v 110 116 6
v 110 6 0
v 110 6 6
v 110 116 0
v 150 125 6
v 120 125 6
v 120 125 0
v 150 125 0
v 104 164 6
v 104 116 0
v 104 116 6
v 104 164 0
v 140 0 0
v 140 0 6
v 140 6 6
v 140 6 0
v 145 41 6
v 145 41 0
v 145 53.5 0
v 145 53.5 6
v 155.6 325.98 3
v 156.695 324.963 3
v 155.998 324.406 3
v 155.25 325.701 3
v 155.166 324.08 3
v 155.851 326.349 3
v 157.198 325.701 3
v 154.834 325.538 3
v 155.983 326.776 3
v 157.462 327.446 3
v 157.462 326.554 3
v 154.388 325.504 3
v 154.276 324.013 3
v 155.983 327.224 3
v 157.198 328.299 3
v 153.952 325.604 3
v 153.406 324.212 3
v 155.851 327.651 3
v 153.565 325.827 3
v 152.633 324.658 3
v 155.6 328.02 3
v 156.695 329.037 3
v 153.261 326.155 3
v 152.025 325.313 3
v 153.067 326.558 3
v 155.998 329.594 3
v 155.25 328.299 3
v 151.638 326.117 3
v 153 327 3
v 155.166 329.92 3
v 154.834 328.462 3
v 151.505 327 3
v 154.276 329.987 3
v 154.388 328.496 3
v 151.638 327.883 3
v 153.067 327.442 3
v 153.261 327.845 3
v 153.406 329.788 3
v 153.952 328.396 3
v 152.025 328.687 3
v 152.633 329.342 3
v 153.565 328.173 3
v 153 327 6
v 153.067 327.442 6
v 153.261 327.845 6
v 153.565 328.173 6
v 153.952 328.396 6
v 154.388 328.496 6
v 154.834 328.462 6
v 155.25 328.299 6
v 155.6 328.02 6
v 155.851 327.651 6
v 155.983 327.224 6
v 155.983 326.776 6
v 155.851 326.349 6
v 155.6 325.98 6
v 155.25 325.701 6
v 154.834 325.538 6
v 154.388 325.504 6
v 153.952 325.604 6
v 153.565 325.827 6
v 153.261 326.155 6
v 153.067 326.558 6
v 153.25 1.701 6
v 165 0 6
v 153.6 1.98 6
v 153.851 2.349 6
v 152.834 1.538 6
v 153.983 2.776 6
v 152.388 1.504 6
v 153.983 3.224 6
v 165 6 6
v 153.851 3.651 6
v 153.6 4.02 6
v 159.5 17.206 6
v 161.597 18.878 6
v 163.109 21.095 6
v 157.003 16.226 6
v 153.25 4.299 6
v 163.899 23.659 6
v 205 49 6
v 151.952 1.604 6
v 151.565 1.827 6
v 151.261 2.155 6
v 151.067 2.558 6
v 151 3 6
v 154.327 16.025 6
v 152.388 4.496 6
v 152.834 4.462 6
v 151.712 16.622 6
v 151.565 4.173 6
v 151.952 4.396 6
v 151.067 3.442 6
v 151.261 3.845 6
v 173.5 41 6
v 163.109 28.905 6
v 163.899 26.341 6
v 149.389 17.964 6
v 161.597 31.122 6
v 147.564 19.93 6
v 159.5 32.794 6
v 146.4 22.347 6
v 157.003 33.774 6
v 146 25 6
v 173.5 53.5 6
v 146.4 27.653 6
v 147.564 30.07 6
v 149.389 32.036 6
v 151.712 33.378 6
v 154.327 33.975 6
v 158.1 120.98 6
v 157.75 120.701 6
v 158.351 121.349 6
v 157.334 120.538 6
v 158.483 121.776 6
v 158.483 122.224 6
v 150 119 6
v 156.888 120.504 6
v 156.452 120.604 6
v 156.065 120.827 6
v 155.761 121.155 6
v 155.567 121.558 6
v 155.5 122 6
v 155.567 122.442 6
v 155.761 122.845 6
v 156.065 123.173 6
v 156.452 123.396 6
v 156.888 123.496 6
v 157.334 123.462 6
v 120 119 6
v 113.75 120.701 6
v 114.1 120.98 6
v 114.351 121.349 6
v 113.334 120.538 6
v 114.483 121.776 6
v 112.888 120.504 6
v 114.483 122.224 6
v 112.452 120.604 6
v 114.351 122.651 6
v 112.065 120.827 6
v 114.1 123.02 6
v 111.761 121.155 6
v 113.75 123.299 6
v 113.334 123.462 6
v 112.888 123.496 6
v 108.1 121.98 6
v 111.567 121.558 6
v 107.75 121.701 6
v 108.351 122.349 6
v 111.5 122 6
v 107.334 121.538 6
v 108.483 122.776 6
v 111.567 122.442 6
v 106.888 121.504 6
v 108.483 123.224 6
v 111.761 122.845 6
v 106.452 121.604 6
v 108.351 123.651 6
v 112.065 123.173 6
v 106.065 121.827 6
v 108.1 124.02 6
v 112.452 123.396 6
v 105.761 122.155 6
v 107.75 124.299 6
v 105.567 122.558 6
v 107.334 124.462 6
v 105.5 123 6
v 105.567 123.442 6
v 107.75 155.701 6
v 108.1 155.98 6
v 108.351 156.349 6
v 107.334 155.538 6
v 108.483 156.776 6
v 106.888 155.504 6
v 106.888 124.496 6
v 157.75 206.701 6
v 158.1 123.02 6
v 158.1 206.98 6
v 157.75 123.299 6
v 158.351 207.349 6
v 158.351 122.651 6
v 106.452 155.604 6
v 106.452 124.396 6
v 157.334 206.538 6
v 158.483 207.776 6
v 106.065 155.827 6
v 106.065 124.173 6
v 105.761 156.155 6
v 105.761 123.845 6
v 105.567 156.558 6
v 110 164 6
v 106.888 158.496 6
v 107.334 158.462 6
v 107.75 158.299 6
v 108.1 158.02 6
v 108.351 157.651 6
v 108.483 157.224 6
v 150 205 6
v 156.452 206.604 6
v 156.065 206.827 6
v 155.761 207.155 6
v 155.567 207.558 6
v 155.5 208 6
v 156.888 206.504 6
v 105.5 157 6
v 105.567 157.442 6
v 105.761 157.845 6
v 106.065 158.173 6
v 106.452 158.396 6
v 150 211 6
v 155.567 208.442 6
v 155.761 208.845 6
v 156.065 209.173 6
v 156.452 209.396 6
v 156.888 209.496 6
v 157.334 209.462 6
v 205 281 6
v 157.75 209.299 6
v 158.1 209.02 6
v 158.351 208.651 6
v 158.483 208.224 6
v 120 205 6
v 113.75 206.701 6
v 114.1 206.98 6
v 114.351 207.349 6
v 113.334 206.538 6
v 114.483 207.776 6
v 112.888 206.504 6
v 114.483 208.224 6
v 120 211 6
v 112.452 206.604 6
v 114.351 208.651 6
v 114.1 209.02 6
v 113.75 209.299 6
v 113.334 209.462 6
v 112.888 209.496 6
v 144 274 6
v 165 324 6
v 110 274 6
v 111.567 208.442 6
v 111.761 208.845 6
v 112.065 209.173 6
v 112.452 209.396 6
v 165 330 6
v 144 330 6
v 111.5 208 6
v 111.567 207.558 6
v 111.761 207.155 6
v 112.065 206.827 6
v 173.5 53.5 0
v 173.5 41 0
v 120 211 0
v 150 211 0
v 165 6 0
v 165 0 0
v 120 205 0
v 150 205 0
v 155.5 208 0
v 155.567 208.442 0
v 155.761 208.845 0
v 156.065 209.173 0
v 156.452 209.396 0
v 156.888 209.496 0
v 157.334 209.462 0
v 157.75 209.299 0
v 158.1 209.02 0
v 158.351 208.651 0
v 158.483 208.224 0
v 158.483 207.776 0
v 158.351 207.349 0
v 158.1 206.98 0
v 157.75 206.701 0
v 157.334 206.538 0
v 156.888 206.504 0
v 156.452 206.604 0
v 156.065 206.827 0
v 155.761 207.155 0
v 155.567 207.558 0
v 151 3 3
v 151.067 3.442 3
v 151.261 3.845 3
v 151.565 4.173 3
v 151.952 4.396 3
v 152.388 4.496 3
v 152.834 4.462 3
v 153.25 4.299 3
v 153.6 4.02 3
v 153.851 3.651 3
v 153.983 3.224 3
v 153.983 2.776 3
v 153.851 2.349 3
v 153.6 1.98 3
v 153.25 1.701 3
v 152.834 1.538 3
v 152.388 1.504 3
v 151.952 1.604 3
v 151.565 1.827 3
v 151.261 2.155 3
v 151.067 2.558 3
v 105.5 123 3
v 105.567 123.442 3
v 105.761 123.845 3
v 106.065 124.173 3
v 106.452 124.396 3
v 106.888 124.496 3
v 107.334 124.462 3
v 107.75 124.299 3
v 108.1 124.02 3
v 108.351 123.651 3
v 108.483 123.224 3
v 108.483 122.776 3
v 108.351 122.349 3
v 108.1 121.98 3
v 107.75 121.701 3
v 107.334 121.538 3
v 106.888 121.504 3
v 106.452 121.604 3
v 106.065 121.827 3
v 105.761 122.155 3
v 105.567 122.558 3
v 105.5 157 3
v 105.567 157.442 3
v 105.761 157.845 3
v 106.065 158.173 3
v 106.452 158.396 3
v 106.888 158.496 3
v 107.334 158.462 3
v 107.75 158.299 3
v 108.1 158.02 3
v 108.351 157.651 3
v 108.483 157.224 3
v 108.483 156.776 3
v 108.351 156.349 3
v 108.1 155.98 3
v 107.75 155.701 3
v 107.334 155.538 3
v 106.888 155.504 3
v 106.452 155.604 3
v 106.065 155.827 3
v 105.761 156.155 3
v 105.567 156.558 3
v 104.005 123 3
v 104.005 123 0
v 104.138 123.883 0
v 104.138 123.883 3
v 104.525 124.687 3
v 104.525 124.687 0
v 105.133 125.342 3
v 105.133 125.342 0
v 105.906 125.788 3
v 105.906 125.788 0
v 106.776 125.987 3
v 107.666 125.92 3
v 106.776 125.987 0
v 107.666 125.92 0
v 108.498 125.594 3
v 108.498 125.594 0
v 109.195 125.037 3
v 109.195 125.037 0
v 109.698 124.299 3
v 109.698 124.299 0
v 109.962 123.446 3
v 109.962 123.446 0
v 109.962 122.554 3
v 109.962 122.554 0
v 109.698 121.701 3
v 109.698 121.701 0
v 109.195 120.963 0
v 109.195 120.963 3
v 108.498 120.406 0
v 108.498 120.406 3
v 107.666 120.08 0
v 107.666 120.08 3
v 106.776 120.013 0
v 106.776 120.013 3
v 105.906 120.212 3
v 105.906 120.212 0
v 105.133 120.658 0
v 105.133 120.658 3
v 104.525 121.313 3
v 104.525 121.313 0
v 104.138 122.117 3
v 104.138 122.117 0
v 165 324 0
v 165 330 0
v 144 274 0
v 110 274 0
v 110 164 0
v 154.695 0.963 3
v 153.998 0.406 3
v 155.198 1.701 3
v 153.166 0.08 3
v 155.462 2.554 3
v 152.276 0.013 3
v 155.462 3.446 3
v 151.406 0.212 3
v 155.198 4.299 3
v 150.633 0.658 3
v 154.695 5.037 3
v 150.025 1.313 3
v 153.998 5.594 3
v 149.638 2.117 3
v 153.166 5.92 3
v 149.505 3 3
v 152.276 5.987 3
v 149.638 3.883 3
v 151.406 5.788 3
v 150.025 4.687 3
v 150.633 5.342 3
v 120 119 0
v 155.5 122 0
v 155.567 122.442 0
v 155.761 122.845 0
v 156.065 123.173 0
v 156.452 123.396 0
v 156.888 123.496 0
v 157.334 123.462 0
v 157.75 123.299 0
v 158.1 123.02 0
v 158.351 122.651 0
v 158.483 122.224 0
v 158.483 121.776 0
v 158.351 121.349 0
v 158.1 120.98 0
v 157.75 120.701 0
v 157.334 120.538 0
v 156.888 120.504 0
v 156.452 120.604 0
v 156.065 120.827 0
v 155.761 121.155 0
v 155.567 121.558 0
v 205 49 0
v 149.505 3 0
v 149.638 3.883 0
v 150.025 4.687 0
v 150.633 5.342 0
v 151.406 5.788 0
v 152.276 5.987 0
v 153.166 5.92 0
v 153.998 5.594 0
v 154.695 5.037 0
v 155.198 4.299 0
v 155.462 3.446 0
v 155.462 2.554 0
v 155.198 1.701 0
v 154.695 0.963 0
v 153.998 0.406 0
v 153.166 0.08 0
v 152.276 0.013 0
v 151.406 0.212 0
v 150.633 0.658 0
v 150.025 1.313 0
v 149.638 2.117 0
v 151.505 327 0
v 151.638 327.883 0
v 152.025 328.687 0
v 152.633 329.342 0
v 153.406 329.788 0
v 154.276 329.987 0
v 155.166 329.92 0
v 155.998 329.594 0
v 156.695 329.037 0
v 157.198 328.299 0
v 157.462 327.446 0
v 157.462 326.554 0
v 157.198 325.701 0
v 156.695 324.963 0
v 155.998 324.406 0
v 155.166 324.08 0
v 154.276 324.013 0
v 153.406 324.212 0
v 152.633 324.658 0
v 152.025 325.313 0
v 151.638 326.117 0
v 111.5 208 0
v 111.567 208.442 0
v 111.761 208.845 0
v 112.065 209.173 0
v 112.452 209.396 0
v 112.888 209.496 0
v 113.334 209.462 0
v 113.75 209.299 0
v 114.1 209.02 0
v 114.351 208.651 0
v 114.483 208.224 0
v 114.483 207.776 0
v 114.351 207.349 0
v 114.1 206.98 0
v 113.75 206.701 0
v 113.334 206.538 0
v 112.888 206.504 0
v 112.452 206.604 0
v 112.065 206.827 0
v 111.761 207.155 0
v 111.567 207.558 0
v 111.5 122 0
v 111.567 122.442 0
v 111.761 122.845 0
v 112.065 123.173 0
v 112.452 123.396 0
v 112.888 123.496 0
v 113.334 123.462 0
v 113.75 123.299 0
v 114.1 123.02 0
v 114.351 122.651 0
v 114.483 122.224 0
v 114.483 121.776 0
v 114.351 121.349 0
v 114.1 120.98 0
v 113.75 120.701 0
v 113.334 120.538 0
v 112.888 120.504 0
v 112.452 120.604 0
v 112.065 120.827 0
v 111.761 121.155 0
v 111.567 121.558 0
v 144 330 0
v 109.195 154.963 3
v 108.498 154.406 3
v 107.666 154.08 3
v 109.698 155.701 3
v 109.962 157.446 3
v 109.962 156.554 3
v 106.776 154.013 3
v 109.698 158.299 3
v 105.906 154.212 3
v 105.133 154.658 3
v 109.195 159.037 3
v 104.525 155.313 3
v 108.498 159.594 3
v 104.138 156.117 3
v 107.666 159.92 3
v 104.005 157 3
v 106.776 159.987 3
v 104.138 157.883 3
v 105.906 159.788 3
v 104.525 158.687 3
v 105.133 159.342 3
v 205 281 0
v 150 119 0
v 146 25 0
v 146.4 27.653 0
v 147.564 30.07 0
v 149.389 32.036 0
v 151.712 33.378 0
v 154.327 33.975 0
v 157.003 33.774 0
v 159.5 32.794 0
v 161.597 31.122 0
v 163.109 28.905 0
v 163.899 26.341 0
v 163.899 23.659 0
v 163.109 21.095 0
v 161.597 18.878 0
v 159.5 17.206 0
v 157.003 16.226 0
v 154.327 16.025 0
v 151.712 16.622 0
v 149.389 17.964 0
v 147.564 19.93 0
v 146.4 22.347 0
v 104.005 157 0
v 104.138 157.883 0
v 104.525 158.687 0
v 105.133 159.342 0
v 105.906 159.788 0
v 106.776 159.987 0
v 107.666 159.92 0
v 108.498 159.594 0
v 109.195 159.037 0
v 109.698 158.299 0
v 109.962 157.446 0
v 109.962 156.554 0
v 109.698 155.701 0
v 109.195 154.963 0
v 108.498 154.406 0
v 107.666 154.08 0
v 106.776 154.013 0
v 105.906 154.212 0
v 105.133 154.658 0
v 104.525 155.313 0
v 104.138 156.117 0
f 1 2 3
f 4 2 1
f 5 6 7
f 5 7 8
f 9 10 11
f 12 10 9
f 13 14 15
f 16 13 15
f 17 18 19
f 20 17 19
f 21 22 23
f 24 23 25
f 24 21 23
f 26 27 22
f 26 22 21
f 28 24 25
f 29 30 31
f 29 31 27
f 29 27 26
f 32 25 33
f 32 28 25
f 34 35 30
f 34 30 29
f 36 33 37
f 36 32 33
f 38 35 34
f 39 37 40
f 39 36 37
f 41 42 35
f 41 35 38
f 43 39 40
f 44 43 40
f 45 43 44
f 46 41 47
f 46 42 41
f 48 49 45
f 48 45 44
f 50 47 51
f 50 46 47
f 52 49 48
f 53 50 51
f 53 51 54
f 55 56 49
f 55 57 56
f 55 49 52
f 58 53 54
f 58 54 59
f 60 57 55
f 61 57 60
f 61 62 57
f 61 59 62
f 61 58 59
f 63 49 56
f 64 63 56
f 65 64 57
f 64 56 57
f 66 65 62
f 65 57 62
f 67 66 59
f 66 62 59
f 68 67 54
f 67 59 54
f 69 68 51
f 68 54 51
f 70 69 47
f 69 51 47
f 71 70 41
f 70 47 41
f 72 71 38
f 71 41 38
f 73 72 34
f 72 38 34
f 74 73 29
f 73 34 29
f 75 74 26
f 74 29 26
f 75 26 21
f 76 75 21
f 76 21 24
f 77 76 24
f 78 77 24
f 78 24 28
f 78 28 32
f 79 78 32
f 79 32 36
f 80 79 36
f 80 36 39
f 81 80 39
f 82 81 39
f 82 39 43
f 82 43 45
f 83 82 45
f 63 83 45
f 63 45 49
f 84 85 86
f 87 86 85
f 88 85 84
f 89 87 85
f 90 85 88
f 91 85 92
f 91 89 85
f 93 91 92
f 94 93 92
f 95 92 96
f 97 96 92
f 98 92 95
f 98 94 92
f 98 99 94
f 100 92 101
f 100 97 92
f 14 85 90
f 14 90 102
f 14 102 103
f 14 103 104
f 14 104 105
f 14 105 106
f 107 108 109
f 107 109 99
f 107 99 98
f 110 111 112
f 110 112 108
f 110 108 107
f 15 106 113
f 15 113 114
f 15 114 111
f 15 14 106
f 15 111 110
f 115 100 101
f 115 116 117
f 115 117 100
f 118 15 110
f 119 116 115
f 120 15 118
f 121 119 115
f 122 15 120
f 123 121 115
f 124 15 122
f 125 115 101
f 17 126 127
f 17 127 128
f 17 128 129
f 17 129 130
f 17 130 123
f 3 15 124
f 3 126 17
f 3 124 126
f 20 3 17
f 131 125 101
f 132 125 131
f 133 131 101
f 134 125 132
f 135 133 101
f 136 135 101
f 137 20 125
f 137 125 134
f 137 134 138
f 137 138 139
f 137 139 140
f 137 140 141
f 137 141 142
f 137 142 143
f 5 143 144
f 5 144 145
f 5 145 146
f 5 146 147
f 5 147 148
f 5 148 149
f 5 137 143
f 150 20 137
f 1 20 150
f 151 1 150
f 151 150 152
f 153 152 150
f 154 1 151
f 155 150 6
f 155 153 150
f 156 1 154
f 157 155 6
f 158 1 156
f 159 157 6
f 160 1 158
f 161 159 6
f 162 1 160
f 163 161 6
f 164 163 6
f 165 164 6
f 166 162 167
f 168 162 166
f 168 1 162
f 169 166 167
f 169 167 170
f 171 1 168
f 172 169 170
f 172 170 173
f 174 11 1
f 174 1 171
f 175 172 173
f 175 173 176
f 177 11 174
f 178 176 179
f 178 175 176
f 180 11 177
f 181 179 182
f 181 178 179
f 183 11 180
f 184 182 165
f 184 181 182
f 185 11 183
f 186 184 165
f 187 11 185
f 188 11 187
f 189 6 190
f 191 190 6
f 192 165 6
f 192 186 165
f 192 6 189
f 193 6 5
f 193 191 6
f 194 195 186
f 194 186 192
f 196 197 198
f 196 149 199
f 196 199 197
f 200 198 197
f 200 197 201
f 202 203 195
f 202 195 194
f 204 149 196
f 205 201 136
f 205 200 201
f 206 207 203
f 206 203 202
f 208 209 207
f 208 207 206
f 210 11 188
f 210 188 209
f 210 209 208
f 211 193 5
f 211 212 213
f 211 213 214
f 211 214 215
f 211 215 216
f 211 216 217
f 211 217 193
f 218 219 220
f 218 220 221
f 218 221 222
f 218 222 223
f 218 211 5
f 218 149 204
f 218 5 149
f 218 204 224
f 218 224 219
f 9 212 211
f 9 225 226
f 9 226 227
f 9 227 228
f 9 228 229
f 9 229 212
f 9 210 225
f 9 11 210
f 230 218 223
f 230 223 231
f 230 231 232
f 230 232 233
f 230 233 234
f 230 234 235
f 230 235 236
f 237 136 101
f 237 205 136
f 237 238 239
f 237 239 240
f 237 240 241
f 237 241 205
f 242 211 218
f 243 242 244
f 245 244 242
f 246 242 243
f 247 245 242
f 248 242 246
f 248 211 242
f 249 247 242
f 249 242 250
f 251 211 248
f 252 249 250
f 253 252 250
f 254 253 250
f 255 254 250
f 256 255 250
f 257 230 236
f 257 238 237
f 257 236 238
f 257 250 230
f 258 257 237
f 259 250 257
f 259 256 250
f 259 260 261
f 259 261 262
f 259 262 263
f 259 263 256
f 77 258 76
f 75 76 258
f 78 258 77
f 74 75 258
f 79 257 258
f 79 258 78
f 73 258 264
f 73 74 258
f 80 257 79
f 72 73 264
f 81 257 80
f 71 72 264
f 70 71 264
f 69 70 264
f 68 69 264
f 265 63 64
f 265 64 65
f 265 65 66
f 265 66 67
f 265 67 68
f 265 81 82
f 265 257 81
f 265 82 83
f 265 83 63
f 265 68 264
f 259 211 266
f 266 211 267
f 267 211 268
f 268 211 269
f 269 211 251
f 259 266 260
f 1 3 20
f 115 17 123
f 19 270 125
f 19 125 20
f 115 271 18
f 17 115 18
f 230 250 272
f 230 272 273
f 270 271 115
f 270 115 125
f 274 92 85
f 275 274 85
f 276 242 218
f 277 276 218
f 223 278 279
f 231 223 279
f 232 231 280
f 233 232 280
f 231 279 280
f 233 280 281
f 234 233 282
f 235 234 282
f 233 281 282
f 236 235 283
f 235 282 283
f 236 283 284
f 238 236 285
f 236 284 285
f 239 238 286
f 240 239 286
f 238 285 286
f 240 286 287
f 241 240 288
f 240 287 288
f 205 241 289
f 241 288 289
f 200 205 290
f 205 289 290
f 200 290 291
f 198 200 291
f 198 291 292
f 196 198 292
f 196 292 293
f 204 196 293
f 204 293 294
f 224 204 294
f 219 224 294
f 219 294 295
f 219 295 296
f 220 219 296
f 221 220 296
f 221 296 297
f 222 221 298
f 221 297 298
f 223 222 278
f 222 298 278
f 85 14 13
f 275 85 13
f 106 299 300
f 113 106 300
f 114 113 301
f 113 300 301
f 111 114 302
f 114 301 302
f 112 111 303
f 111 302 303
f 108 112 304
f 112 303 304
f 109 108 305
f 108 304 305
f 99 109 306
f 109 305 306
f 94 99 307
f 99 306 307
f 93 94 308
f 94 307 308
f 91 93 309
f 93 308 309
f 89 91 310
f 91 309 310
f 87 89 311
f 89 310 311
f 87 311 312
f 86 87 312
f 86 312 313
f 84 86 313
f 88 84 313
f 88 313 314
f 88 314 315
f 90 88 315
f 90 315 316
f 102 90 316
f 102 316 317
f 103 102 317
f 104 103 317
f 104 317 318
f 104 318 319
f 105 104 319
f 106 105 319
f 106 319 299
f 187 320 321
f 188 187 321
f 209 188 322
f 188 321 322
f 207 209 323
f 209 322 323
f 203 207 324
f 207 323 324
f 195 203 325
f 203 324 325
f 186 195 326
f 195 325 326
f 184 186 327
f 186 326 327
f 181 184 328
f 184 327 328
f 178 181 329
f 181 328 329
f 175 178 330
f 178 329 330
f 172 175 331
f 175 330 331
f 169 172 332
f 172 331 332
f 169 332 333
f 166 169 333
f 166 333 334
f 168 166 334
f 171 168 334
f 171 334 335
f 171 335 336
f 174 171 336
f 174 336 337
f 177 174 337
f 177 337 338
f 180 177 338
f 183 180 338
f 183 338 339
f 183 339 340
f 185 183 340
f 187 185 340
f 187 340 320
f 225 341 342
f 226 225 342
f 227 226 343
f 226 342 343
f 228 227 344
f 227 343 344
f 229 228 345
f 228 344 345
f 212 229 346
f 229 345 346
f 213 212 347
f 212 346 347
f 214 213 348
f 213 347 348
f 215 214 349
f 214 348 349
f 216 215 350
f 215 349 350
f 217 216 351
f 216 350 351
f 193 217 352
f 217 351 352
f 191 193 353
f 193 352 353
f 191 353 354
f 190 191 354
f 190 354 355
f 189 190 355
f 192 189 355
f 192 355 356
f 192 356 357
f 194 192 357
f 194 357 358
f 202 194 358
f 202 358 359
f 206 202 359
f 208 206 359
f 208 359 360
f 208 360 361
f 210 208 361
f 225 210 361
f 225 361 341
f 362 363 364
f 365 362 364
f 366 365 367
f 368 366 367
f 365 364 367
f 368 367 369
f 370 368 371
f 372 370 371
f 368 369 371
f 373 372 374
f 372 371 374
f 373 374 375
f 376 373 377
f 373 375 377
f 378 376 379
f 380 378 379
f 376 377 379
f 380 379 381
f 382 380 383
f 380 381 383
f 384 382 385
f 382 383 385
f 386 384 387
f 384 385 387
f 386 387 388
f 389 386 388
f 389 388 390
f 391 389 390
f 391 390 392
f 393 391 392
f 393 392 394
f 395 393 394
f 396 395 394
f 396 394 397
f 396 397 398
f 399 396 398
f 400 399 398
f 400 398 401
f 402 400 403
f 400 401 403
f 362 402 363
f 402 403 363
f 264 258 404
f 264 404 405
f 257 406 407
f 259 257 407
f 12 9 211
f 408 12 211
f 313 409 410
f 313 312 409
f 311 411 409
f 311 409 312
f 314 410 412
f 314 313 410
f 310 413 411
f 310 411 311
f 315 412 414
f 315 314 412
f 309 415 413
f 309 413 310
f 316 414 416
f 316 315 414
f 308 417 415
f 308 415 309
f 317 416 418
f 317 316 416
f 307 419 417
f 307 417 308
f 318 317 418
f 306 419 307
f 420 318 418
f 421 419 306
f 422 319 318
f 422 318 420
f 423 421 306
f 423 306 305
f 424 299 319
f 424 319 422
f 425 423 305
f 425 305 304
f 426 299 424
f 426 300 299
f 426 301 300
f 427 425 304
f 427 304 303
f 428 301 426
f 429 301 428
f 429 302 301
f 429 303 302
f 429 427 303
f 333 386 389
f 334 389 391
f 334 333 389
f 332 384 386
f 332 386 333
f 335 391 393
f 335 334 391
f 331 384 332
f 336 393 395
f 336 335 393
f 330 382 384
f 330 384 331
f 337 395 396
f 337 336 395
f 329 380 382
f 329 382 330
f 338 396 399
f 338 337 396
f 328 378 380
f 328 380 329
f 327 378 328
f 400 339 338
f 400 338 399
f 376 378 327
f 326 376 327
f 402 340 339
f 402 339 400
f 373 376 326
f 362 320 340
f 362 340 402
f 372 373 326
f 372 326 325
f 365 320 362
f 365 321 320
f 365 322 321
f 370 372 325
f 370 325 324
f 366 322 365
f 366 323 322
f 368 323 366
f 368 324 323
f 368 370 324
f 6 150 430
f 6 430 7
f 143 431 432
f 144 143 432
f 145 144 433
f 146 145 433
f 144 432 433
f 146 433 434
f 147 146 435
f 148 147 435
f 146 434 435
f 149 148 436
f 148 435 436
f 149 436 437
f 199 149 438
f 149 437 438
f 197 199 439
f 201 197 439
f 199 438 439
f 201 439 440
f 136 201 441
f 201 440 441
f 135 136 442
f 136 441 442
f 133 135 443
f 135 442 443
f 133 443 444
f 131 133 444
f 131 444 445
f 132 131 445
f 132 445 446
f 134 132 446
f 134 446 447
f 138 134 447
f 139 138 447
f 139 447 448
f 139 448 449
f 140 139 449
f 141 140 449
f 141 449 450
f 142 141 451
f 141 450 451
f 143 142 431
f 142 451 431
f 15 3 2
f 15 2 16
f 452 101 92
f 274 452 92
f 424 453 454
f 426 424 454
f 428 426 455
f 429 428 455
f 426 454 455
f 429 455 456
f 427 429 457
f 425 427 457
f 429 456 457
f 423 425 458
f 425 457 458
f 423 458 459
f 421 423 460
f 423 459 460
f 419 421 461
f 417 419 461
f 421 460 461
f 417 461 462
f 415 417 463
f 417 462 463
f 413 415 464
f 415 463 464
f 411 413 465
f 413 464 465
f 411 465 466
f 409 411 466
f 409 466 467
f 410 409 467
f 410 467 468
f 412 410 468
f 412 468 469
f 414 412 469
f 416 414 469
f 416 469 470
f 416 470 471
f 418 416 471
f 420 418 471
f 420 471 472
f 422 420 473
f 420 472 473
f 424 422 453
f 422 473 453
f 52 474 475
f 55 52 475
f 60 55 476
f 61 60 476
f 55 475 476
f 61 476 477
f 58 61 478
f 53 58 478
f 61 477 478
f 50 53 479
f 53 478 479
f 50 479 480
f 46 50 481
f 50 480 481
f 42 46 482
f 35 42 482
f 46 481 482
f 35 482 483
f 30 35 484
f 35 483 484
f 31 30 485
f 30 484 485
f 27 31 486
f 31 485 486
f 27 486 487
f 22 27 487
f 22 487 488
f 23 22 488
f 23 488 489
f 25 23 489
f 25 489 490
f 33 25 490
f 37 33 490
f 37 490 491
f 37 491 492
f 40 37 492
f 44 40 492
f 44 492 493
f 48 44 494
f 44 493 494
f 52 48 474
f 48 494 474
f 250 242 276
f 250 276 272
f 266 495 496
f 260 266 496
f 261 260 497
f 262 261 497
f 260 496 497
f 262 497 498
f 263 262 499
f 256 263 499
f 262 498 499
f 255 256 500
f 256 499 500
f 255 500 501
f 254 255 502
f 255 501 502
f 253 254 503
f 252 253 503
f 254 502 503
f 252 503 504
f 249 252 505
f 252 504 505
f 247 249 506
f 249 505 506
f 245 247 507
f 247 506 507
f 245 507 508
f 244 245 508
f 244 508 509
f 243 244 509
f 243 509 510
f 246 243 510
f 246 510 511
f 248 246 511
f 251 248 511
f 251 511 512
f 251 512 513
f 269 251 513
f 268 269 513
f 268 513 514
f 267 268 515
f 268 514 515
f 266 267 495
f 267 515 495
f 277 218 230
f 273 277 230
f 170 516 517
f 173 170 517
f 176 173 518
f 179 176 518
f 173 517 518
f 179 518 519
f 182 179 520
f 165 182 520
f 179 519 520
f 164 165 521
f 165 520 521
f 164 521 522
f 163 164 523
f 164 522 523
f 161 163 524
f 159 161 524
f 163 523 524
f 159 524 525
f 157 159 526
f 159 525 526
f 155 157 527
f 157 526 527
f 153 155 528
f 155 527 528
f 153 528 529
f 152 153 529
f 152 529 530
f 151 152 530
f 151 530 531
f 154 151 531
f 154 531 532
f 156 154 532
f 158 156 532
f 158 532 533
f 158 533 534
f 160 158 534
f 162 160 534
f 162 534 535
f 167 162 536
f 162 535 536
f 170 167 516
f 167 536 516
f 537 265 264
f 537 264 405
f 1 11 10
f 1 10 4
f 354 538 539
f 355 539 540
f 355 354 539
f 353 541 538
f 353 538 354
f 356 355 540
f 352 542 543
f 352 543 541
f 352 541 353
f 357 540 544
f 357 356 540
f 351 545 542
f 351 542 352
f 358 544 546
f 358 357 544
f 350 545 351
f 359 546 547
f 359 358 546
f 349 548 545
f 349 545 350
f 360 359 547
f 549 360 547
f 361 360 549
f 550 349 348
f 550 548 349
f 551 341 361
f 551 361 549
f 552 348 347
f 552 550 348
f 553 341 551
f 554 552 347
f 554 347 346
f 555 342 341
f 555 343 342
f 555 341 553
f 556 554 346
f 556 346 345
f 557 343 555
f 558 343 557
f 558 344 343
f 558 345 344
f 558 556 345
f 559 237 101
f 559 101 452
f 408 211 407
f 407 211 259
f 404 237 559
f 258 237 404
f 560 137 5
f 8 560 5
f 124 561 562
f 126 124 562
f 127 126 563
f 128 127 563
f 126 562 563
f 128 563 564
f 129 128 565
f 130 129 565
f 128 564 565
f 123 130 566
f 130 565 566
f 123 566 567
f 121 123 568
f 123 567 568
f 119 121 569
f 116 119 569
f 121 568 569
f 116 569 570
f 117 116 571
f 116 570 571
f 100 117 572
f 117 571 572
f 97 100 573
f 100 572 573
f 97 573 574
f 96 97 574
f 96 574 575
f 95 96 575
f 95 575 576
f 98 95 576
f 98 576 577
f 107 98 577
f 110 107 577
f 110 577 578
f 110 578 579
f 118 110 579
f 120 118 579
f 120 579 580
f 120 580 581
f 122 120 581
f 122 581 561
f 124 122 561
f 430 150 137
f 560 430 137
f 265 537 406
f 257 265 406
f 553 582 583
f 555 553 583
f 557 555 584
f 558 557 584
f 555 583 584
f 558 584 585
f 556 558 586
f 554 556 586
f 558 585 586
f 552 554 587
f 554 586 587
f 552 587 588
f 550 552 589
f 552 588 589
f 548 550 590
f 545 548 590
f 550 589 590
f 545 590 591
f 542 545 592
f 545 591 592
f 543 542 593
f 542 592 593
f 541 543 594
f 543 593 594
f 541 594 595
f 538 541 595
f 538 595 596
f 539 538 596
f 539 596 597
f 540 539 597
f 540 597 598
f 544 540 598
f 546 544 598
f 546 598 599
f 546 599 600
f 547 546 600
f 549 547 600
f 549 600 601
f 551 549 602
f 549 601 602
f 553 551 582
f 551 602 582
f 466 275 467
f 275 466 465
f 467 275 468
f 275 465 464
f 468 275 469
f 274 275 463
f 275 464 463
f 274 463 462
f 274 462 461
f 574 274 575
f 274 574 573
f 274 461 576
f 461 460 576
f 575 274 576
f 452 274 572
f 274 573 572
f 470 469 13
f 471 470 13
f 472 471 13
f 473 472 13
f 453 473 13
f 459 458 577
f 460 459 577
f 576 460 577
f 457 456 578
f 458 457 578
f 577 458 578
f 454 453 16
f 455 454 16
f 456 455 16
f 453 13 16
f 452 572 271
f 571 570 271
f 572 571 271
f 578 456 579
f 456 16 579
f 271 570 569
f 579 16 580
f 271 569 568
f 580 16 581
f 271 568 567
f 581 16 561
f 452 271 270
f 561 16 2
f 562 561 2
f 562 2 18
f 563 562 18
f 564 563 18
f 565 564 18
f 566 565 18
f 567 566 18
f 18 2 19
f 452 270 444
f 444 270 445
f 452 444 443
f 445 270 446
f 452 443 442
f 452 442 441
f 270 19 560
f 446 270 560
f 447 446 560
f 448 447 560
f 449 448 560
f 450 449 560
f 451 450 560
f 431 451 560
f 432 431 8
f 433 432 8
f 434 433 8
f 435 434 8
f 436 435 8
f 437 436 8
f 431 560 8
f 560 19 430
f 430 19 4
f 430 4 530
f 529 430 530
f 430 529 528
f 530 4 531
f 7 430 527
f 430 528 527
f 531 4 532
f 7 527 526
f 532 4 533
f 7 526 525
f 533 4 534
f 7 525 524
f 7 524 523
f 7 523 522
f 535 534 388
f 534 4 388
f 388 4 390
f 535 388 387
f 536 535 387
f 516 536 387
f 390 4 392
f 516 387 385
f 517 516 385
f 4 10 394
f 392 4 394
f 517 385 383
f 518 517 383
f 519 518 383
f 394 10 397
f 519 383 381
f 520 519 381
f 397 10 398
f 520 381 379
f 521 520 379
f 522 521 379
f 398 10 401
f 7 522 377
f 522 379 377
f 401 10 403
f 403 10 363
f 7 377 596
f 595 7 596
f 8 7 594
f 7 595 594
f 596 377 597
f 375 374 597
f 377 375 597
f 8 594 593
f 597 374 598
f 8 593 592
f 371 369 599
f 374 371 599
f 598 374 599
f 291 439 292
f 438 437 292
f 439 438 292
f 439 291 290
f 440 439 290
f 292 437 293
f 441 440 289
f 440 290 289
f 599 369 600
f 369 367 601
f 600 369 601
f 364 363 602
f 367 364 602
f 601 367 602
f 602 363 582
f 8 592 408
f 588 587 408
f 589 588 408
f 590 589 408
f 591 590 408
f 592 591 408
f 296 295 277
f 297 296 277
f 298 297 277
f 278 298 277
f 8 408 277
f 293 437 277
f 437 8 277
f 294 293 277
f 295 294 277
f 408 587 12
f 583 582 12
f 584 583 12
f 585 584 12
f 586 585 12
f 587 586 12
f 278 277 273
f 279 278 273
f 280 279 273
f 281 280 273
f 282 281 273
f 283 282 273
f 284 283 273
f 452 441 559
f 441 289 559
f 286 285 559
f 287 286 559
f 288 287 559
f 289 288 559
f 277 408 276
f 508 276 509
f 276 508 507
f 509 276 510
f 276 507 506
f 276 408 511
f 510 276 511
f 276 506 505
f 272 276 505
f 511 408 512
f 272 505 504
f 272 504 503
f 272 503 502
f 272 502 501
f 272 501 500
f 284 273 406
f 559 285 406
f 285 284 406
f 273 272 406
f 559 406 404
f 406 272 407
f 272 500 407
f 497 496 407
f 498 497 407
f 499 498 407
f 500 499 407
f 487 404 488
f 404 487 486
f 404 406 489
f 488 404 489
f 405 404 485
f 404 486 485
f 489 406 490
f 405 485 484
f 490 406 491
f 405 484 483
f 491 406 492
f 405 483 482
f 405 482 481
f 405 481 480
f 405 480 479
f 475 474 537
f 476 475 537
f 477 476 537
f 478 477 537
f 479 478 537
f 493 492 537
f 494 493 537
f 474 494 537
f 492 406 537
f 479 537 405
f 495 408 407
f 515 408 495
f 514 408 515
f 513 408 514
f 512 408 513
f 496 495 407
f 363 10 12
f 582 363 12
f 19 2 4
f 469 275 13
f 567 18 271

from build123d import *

# Parameters (mm, degrees)
ESQUISSE1_W              = 148
ESQUISSE1_H              = 330
BOSS_EXTRU_1_DEPTH       = 6
ESQUISSE2_W              = 30
ESQUISSE2_H              = 6
ESQUISSE2_W_2            = 6
ESQUISSE2_H_2            = 40
ENL_V_MAT_EXTRU_1_DEPTH  = 6
ESQUISSE6_W              = 6
ESQUISSE6_H              = 60
ENL_V_MAT_EXTRU_4_DEPTH  = 10
ESQUISSE8_W              = 6
ESQUISSE8_H              = 330
BOSS_EXTRU_2_DEPTH       = 57
ENL_V_MAT_EXTRU_5_DEPTH  = 389.536999525
ESQUISSE10_W             = 30
ESQUISSE10_H             = 6
ENL_V_MAT_EXTRU_6_DEPTH  = 389.536999525
ENL_V_MAT_EXTRU_9_DEPTH  = 389.536999525
ENL_V_MAT_EXTRU_11_DEPTH = 10
ESQUISSE16_R             = 1.5
ENL_V_MAT_EXTRU_12_DEPTH = 6
ESQUISSE17_R             = 2.995
ENL_V_MAT_EXTRU_13_DEPTH = 3
ESQUISSE18_R             = 9
ESQUISSE18_W             = 28.5
ESQUISSE18_H             = 12.5
ENL_V_MAT_EXTRU_14_DEPTH = 389.536999525
ESQUISSE5_W              = 30
ESQUISSE5_H              = 6
ESQUISSE5_H_2            = 3
ENL_V_MAT_EXTRU_15_DEPTH = 389.536999525


with BuildPart() as part:
    # Esquisse1 → Boss.-Extru.1 (new body)
    with BuildSketch(Plane.XY):
        with Locations((74, 165)):
            Rectangle(ESQUISSE1_W, ESQUISSE1_H)
    extrude(amount=BOSS_EXTRU_1_DEPTH)

    # Esquisse2 → Enlèv. mat.-Extru.1 (cut)
    with BuildSketch(Plane.XY.offset(6)):
        with Locations((45, 3)):
            Rectangle(ESQUISSE2_W, ESQUISSE2_H)
        with Locations((125, 3)):
            Rectangle(ESQUISSE2_W, ESQUISSE2_H)
        with Locations((45, 327)):
            Rectangle(ESQUISSE2_W, ESQUISSE2_H)
        with Locations((117, 327)):
            Rectangle(ESQUISSE2_W, ESQUISSE2_H)
        with Locations((3, 245)):
            Rectangle(ESQUISSE2_W_2, ESQUISSE2_H_2)
        with Locations((3, 165)):
            Rectangle(ESQUISSE2_W_2, ESQUISSE2_H_2)
        with Locations((3, 85)):
            Rectangle(ESQUISSE2_W_2, ESQUISSE2_H_2)
    extrude(amount=-ENL_V_MAT_EXTRU_1_DEPTH, mode=Mode.SUBTRACT)

    # Esquisse6 → Enlèv. mat.-Extru.4 (cut)
    with BuildSketch(Plane.XY.offset(6)):
        with Locations((107, 86)):
            Rectangle(ESQUISSE6_W, ESQUISSE6_H)
        with Locations((107, 194)):
            Rectangle(ESQUISSE6_W, ESQUISSE6_H)
    extrude(amount=-ENL_V_MAT_EXTRU_4_DEPTH, mode=Mode.SUBTRACT)

    # Esquisse8 → Boss.-Extru.2 (add)
    with BuildSketch(Plane(origin=(148, 0, 0), x_dir=(0, 0, -1), z_dir=(1, 0, 0))):
        with Locations((-3, 165)):
            Rectangle(ESQUISSE8_W, ESQUISSE8_H)
    extrude(amount=BOSS_EXTRU_2_DEPTH)

    # Esquisse9 → Enlèv. mat.-Extru.5 (cut, through all)
    with BuildSketch(Plane.XY.offset(6)):
        Polygon((165, 0), (205, 0), (205, 49), (165, 6), align=None)
        Polygon((165, 330), (205, 330), (205, 281), (165, 324), align=None)
    extrude(amount=-ENL_V_MAT_EXTRU_5_DEPTH, mode=Mode.SUBTRACT)

    # Esquisse10 → Enlèv. mat.-Extru.6 (cut, through all)
    with BuildSketch(Plane.XY.offset(6)):
        with Locations((135, 208)):
            Rectangle(ESQUISSE10_W, ESQUISSE10_H)
        with Locations((135, 122)):
            Rectangle(ESQUISSE10_W, ESQUISSE10_H)
    extrude(amount=-ENL_V_MAT_EXTRU_6_DEPTH, mode=Mode.SUBTRACT)

    # Esquisse13 → Enlèv. mat.-Extru.9 (cut, through all)
    with BuildSketch(Plane(origin=(0, 0, 0), x_dir=(-1, 0, 0), z_dir=(0, 0, -1))):
        Polygon((-88, 330), (-144, 330), (-144, 274), (-110, 274), (-110, 280), (-88, 280), align=None)
    extrude(amount=-ENL_V_MAT_EXTRU_9_DEPTH, mode=Mode.SUBTRACT)

    # Esquisse15 → Enlèv. mat.-Extru.11 (cut)
    with BuildSketch(Plane(origin=(0, 0, 0), x_dir=(-1, 0, 0), z_dir=(0, 0, -1))):
        Polygon((-110, 0), (-110, 116), (-104, 116), (-104, 164), (-110, 164), (-110, 280), (-88, 280), (-88, 330), (0, 330), (0, 0), align=None)
    extrude(amount=-ENL_V_MAT_EXTRU_11_DEPTH, mode=Mode.SUBTRACT)

    # Esquisse16 → Enlèv. mat.-Extru.12 (cut)
    with BuildSketch(Plane(origin=(0, 0, 0), x_dir=(-1, 0, 0), z_dir=(0, 0, -1))):
        with Locations((-152.5, 3)):
            Circle(ESQUISSE16_R)
        with Locations((-107, 123)):
            Circle(ESQUISSE16_R)
        with Locations((-107, 157)):
            Circle(ESQUISSE16_R)
        with Locations((-154.5, 327)):
            Circle(ESQUISSE16_R)
        with Locations((-157, 122)):
            Circle(ESQUISSE16_R)
        with Locations((-157, 208)):
            Circle(ESQUISSE16_R)
        with Locations((-113, 122)):
            Circle(ESQUISSE16_R)
        with Locations((-113, 208)):
            Circle(ESQUISSE16_R)
    extrude(amount=-ENL_V_MAT_EXTRU_12_DEPTH, mode=Mode.SUBTRACT)

    # Esquisse17 → Enlèv. mat.-Extru.13 (cut)
    with BuildSketch(Plane(origin=(0, 0, 0), x_dir=(-1, 0, 0), z_dir=(0, 0, -1))):
        with Locations((-152.5, 3)):
            Circle(ESQUISSE17_R)
        with Locations((-107, 123)):
            Circle(ESQUISSE17_R)
        with Locations((-107, 157)):
            Circle(ESQUISSE17_R)
        with Locations((-154.5, 327)):
            Circle(ESQUISSE17_R)
    extrude(amount=-ENL_V_MAT_EXTRU_13_DEPTH, mode=Mode.SUBTRACT)

    # Esquisse18 → Enlèv. mat.-Extru.14 (cut, through all)
    with BuildSketch(Plane(origin=(0, 0, 0), x_dir=(-1, 0, 0), z_dir=(0, 0, -1))):
        with Locations((-155, 25)):
            Circle(ESQUISSE18_R)
        with Locations((-159.25, 47.25)):
            Rectangle(ESQUISSE18_W, ESQUISSE18_H)
    extrude(amount=-ENL_V_MAT_EXTRU_14_DEPTH, mode=Mode.SUBTRACT)

    # Esquisse5 → Enlèv. mat.-Extru.15 (cut, through all)
    with BuildSketch(Plane.XY.offset(6)):
        with Locations((56.5, 277)):
            Rectangle(ESQUISSE5_W, ESQUISSE5_H)
        with Locations((56.5, 133.5)):
            Rectangle(ESQUISSE5_W, ESQUISSE5_H_2)
    extrude(amount=-ENL_V_MAT_EXTRU_15_DEPTH, mode=Mode.SUBTRACT)


solid = part.part
